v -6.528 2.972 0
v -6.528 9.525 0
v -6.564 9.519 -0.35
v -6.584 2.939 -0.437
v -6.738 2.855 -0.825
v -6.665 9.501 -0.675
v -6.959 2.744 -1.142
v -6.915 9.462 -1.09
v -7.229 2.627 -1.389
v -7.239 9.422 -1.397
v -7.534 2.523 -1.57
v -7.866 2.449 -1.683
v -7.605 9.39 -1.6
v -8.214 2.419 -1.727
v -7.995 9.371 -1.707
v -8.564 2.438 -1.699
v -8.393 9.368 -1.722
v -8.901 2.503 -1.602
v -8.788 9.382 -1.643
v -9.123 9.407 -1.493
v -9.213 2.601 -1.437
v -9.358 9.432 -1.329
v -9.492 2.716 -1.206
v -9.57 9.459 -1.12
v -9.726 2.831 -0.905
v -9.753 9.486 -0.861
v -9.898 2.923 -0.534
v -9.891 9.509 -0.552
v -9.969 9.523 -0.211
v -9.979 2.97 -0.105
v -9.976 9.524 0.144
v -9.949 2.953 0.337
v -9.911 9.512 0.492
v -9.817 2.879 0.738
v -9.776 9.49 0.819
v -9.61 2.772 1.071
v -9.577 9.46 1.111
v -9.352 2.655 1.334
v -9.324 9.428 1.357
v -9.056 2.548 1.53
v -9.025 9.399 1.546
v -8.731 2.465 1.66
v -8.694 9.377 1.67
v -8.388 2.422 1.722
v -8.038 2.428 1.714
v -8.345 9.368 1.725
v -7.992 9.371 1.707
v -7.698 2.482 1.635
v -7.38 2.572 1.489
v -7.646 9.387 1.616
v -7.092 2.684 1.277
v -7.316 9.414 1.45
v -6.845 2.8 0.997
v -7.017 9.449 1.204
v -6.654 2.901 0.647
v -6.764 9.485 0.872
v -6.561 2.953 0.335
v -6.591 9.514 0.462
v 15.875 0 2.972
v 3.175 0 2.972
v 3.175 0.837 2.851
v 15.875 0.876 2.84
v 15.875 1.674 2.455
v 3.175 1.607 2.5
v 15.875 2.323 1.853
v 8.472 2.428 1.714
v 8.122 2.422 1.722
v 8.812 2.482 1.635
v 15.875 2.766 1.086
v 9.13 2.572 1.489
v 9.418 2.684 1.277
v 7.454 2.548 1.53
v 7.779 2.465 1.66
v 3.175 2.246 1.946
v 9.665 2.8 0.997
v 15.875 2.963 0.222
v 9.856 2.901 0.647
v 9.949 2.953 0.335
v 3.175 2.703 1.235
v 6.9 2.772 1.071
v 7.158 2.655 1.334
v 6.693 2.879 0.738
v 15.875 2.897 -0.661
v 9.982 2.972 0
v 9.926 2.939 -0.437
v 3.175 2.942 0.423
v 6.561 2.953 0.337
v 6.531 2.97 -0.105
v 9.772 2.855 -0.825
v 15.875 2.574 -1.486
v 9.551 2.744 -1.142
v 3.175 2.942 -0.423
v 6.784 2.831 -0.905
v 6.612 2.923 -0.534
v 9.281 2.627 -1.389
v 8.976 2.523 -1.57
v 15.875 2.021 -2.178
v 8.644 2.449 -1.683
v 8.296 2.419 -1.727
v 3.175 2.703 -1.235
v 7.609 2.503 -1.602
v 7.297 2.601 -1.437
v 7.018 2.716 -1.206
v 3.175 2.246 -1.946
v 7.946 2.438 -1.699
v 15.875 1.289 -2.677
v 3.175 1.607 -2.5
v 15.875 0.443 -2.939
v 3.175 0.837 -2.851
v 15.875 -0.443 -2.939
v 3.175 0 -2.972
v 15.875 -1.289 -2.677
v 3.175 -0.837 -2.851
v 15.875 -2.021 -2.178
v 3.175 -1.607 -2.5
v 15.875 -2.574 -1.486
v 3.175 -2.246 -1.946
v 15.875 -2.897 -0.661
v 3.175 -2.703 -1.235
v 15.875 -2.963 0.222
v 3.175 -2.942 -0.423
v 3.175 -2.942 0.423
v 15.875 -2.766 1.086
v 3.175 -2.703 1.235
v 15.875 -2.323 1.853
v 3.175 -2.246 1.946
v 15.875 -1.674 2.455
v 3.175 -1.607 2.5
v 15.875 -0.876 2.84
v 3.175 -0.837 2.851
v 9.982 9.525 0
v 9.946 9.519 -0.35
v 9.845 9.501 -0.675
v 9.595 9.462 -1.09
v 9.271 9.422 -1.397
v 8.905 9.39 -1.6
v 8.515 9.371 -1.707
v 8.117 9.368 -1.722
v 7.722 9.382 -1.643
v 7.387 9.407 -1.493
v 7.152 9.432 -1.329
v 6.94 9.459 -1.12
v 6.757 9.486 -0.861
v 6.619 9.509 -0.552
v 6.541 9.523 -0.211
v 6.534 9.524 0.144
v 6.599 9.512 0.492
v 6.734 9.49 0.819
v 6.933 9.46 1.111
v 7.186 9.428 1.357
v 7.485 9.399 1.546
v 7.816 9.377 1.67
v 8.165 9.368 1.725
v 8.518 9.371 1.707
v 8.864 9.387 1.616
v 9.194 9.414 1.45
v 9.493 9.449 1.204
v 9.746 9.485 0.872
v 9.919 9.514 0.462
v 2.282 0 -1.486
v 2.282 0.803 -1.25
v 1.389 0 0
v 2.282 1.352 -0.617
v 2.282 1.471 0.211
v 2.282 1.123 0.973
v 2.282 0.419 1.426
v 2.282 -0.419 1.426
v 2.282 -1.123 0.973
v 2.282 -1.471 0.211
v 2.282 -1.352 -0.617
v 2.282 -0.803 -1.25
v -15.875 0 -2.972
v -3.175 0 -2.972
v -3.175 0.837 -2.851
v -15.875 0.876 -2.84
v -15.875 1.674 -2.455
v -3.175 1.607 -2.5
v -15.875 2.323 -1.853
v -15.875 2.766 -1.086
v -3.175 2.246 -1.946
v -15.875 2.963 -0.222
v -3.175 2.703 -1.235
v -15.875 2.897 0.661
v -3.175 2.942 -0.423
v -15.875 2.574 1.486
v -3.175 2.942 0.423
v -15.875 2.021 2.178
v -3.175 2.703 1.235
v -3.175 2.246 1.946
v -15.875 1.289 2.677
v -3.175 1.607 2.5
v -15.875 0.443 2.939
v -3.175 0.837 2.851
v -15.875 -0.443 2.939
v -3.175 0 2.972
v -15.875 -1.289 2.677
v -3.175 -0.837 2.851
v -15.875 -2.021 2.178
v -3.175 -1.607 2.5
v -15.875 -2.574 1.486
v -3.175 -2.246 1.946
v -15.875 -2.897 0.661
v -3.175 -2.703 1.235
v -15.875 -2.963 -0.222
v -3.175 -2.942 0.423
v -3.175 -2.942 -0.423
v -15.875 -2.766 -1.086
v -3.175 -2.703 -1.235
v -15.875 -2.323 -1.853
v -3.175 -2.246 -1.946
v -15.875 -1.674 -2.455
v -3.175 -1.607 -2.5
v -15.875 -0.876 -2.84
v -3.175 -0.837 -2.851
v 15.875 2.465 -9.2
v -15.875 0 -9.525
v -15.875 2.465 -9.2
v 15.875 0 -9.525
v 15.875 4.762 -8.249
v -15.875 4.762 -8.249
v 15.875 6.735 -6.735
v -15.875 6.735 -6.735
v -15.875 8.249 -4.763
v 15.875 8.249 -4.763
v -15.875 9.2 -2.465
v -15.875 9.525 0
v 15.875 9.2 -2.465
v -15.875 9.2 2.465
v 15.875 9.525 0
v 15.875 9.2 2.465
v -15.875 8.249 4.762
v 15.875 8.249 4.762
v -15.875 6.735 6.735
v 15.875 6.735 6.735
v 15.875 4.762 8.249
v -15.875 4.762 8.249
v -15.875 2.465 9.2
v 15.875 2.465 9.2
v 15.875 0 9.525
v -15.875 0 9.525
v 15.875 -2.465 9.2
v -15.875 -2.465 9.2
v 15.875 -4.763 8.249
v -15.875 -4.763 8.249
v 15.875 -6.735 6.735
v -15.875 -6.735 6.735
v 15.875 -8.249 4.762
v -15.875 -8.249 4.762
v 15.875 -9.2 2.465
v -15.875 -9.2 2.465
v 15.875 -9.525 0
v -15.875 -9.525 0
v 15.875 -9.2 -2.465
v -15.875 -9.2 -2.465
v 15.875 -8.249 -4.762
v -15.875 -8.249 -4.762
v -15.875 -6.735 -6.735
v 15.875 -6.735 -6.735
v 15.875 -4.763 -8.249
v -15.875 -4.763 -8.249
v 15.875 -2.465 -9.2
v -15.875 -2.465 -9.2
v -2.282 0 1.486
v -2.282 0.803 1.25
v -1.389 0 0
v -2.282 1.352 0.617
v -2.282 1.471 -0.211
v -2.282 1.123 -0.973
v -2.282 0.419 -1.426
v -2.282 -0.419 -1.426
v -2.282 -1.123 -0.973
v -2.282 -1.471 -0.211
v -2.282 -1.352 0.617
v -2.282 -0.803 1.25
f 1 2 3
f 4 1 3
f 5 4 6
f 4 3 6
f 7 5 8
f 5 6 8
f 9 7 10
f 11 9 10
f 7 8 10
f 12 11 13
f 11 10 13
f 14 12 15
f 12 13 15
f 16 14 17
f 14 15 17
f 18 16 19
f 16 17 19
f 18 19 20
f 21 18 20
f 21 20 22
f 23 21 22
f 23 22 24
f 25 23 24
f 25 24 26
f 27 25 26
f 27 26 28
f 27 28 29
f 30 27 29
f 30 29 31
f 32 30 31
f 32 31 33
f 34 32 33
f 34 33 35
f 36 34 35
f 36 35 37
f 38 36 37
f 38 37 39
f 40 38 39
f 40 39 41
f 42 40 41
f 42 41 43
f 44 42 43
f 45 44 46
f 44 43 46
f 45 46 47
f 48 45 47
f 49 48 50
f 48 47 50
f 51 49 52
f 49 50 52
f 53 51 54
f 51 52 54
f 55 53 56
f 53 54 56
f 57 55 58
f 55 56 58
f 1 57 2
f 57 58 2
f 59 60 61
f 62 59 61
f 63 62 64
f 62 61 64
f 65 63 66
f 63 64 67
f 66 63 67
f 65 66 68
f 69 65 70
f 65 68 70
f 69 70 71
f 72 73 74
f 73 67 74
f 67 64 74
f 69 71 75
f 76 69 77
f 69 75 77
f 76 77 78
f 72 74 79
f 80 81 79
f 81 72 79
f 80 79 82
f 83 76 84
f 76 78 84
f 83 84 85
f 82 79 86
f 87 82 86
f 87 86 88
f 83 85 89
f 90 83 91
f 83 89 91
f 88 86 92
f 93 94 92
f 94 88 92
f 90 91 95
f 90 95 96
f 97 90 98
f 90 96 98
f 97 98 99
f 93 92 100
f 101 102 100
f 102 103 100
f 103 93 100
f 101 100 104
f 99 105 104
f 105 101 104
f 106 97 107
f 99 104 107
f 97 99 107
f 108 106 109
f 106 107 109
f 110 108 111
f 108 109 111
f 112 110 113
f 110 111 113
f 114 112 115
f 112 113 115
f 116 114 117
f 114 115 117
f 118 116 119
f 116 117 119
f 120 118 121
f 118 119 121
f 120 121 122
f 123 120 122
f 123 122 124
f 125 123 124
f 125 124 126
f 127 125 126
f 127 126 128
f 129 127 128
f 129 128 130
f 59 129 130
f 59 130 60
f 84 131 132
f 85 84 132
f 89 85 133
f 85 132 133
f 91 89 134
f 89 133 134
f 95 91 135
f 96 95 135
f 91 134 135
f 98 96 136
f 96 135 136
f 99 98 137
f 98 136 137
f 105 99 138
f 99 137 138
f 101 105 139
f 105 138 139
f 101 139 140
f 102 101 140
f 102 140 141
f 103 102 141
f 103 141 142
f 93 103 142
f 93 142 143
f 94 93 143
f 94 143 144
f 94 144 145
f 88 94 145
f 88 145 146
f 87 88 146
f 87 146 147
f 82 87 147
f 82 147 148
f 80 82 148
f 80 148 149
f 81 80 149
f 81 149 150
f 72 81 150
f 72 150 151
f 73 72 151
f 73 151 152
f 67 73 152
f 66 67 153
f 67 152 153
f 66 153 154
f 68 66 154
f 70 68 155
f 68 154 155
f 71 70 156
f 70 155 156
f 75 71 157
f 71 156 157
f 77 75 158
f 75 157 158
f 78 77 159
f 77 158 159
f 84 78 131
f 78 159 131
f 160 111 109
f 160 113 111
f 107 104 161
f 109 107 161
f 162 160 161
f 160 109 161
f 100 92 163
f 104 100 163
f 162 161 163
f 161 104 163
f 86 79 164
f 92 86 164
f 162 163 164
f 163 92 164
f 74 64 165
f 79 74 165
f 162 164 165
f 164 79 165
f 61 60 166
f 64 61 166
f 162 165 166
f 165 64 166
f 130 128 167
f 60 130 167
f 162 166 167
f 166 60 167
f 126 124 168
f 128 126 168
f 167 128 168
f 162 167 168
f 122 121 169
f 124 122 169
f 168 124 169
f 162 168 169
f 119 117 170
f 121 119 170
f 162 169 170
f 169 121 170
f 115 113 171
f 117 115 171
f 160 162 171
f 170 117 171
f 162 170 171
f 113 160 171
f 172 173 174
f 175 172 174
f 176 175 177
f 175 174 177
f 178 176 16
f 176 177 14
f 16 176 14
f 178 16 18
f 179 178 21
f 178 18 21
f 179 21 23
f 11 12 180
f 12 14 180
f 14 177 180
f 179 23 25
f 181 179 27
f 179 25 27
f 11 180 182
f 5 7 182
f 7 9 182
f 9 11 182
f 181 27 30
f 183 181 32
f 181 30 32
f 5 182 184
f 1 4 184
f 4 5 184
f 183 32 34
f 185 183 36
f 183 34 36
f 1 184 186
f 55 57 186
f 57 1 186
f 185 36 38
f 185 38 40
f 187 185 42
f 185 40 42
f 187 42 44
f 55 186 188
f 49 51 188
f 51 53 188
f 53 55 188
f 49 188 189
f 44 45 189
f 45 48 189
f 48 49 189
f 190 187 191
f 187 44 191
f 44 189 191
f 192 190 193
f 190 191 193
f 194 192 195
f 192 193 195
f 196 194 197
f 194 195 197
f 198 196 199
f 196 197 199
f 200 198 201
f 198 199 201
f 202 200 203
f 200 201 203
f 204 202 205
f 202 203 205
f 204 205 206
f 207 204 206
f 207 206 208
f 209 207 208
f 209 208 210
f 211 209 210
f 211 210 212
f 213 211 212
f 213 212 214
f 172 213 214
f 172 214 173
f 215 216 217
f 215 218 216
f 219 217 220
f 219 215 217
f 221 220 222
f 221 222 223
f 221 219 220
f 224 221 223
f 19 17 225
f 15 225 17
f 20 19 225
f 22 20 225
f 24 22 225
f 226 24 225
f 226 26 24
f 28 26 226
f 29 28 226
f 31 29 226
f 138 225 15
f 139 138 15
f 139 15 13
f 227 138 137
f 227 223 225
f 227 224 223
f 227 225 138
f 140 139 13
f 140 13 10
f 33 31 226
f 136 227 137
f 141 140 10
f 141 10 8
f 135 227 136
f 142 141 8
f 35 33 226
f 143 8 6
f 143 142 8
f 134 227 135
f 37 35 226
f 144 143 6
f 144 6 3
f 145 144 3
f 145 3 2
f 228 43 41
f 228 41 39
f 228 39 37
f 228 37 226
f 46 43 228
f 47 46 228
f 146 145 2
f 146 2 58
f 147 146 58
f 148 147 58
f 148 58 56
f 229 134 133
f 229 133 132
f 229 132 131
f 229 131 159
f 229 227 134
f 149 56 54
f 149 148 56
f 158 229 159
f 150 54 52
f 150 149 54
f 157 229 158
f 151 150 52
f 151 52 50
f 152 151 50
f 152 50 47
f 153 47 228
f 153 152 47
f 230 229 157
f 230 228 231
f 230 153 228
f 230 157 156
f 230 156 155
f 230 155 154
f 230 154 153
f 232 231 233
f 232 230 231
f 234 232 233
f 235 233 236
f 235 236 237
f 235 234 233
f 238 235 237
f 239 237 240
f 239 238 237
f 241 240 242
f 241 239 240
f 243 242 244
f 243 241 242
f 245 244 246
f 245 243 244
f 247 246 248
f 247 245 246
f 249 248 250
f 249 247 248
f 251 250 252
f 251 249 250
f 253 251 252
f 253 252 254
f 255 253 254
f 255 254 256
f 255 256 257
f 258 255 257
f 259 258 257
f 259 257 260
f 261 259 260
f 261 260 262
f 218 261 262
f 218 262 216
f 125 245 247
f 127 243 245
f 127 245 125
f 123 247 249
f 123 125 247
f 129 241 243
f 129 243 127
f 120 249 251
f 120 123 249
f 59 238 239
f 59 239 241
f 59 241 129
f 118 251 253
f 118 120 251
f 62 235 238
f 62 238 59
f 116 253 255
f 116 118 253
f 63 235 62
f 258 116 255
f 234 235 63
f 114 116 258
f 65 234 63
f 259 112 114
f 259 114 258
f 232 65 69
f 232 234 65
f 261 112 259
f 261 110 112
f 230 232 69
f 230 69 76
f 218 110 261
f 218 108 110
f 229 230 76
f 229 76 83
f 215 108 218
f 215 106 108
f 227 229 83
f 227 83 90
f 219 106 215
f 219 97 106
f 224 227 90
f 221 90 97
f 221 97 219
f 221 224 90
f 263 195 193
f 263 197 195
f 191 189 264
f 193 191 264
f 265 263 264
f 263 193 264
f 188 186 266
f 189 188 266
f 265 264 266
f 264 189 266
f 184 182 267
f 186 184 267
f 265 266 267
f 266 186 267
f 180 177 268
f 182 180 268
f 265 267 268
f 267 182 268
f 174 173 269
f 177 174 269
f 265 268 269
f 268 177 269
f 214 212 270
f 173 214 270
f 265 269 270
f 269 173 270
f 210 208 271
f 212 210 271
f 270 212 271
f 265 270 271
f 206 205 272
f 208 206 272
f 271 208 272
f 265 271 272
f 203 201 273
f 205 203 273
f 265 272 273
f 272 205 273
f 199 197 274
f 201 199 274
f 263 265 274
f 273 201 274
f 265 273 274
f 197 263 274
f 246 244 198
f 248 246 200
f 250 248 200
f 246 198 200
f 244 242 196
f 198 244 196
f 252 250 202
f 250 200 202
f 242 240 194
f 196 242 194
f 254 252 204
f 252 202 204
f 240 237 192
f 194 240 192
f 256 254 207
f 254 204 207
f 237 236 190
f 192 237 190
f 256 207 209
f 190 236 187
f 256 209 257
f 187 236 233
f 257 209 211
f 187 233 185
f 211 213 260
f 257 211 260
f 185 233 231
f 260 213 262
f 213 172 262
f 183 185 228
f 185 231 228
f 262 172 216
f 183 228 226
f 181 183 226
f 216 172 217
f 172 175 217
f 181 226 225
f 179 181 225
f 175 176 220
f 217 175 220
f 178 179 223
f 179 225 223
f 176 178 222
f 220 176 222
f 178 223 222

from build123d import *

# Parameters (mm, degrees)
SKETCH1_R                         = 9.525
BOSS_EXTRUDE1_DEPTH               = 15.875
A_DIAMETER_DRIVE_SHAFT_SIDE_D     = 5.9436
A_DIAMETER_DRIVE_SHAFT_SIDE_DEPTH = 12.7
A_DIAMETER_DRIVE_SHAFT_SIDE_TIP   = 1.785637588
A_DIAMETER_MOTOR_SHAFT_SIDE_D     = 5.9436
A_DIAMETER_MOTOR_SHAFT_SIDE_DEPTH = 12.7
A_DIAMETER_MOTOR_SHAFT_SIDE_TIP   = 1.785637588
F_8_32_TAPPED_HOLE1_REACH         = 28.564
F_8_32_TAPPED_HOLE1_BORE_R        = 1.7272


with BuildPart() as part:
    # Sketch1 → Boss-Extrude1 (new, symmetric)
    with BuildSketch(Plane(origin=(0, 0, 0), x_dir=(0, 0, -1), z_dir=(1, 0, 0))):
        Circle(SKETCH1_R)
    extrude(amount=BOSS_EXTRUDE1_DEPTH, both=True)

    # A Diameter Drive Shaft Side
    with Locations(Plane.ZY.offset(15.875)):
        with Locations((0, 0)):
            Hole(A_DIAMETER_DRIVE_SHAFT_SIDE_D / 2, depth=A_DIAMETER_DRIVE_SHAFT_SIDE_DEPTH)
            with Locations((0, 0, -(A_DIAMETER_DRIVE_SHAFT_SIDE_DEPTH + A_DIAMETER_DRIVE_SHAFT_SIDE_TIP / 2))):  # 118° drill point
                Cone(0, A_DIAMETER_DRIVE_SHAFT_SIDE_D / 2, A_DIAMETER_DRIVE_SHAFT_SIDE_TIP, mode=Mode.SUBTRACT)

    # A Diameter Motor Shaft Side
    with Locations(Plane(origin=(15.875, 0, 0), x_dir=(0, 0, -1), z_dir=(1, 0, 0))):
        with Locations((0, 0)):
            Hole(A_DIAMETER_MOTOR_SHAFT_SIDE_D / 2, depth=A_DIAMETER_MOTOR_SHAFT_SIDE_DEPTH)
            with Locations((0, 0, -(A_DIAMETER_MOTOR_SHAFT_SIDE_DEPTH + A_DIAMETER_MOTOR_SHAFT_SIDE_TIP / 2))):  # 118° drill point
                Cone(0, A_DIAMETER_MOTOR_SHAFT_SIDE_D / 2, A_DIAMETER_MOTOR_SHAFT_SIDE_TIP, mode=Mode.SUBTRACT)

    # #8-32 Tapped Hole1 bore → #8-32 Tapped Hole1 (cut, up to next)
    with BuildSketch(Plane(origin=(0, 9.525, 0), x_dir=(1, 0, 0), z_dir=(0, 1, 0)), mode=Mode.PRIVATE) as f_8_32_tapped_hole1_sk1:
        with Locations((-8.255, 0)):
            Circle(F_8_32_TAPPED_HOLE1_BORE_R)
    f_8_32_tapped_hole1_tool1 = extrude(f_8_32_tapped_hole1_sk1.sketch, amount=-F_8_32_TAPPED_HOLE1_REACH, mode=Mode.PRIVATE) & part.part
    # #8-32 Tapped Hole1 bore → #8-32 Tapped Hole1 (cut, up to next)
    with BuildSketch(Plane(origin=(0, 9.525, 0), x_dir=(1, 0, 0), z_dir=(0, 1, 0)), mode=Mode.PRIVATE) as f_8_32_tapped_hole1_sk2:
        with Locations((8.255, 0)):
            Circle(F_8_32_TAPPED_HOLE1_BORE_R)
    f_8_32_tapped_hole1_tool2 = extrude(f_8_32_tapped_hole1_sk2.sketch, amount=-F_8_32_TAPPED_HOLE1_REACH, mode=Mode.PRIVATE) & part.part
    add(f_8_32_tapped_hole1_tool1.solids().sort_by_distance((-8.255, 9.525, 0))[0], mode=Mode.SUBTRACT)
    add(f_8_32_tapped_hole1_tool2.solids().sort_by_distance((8.255, 9.525, 0))[0], mode=Mode.SUBTRACT)


solid = part.part
